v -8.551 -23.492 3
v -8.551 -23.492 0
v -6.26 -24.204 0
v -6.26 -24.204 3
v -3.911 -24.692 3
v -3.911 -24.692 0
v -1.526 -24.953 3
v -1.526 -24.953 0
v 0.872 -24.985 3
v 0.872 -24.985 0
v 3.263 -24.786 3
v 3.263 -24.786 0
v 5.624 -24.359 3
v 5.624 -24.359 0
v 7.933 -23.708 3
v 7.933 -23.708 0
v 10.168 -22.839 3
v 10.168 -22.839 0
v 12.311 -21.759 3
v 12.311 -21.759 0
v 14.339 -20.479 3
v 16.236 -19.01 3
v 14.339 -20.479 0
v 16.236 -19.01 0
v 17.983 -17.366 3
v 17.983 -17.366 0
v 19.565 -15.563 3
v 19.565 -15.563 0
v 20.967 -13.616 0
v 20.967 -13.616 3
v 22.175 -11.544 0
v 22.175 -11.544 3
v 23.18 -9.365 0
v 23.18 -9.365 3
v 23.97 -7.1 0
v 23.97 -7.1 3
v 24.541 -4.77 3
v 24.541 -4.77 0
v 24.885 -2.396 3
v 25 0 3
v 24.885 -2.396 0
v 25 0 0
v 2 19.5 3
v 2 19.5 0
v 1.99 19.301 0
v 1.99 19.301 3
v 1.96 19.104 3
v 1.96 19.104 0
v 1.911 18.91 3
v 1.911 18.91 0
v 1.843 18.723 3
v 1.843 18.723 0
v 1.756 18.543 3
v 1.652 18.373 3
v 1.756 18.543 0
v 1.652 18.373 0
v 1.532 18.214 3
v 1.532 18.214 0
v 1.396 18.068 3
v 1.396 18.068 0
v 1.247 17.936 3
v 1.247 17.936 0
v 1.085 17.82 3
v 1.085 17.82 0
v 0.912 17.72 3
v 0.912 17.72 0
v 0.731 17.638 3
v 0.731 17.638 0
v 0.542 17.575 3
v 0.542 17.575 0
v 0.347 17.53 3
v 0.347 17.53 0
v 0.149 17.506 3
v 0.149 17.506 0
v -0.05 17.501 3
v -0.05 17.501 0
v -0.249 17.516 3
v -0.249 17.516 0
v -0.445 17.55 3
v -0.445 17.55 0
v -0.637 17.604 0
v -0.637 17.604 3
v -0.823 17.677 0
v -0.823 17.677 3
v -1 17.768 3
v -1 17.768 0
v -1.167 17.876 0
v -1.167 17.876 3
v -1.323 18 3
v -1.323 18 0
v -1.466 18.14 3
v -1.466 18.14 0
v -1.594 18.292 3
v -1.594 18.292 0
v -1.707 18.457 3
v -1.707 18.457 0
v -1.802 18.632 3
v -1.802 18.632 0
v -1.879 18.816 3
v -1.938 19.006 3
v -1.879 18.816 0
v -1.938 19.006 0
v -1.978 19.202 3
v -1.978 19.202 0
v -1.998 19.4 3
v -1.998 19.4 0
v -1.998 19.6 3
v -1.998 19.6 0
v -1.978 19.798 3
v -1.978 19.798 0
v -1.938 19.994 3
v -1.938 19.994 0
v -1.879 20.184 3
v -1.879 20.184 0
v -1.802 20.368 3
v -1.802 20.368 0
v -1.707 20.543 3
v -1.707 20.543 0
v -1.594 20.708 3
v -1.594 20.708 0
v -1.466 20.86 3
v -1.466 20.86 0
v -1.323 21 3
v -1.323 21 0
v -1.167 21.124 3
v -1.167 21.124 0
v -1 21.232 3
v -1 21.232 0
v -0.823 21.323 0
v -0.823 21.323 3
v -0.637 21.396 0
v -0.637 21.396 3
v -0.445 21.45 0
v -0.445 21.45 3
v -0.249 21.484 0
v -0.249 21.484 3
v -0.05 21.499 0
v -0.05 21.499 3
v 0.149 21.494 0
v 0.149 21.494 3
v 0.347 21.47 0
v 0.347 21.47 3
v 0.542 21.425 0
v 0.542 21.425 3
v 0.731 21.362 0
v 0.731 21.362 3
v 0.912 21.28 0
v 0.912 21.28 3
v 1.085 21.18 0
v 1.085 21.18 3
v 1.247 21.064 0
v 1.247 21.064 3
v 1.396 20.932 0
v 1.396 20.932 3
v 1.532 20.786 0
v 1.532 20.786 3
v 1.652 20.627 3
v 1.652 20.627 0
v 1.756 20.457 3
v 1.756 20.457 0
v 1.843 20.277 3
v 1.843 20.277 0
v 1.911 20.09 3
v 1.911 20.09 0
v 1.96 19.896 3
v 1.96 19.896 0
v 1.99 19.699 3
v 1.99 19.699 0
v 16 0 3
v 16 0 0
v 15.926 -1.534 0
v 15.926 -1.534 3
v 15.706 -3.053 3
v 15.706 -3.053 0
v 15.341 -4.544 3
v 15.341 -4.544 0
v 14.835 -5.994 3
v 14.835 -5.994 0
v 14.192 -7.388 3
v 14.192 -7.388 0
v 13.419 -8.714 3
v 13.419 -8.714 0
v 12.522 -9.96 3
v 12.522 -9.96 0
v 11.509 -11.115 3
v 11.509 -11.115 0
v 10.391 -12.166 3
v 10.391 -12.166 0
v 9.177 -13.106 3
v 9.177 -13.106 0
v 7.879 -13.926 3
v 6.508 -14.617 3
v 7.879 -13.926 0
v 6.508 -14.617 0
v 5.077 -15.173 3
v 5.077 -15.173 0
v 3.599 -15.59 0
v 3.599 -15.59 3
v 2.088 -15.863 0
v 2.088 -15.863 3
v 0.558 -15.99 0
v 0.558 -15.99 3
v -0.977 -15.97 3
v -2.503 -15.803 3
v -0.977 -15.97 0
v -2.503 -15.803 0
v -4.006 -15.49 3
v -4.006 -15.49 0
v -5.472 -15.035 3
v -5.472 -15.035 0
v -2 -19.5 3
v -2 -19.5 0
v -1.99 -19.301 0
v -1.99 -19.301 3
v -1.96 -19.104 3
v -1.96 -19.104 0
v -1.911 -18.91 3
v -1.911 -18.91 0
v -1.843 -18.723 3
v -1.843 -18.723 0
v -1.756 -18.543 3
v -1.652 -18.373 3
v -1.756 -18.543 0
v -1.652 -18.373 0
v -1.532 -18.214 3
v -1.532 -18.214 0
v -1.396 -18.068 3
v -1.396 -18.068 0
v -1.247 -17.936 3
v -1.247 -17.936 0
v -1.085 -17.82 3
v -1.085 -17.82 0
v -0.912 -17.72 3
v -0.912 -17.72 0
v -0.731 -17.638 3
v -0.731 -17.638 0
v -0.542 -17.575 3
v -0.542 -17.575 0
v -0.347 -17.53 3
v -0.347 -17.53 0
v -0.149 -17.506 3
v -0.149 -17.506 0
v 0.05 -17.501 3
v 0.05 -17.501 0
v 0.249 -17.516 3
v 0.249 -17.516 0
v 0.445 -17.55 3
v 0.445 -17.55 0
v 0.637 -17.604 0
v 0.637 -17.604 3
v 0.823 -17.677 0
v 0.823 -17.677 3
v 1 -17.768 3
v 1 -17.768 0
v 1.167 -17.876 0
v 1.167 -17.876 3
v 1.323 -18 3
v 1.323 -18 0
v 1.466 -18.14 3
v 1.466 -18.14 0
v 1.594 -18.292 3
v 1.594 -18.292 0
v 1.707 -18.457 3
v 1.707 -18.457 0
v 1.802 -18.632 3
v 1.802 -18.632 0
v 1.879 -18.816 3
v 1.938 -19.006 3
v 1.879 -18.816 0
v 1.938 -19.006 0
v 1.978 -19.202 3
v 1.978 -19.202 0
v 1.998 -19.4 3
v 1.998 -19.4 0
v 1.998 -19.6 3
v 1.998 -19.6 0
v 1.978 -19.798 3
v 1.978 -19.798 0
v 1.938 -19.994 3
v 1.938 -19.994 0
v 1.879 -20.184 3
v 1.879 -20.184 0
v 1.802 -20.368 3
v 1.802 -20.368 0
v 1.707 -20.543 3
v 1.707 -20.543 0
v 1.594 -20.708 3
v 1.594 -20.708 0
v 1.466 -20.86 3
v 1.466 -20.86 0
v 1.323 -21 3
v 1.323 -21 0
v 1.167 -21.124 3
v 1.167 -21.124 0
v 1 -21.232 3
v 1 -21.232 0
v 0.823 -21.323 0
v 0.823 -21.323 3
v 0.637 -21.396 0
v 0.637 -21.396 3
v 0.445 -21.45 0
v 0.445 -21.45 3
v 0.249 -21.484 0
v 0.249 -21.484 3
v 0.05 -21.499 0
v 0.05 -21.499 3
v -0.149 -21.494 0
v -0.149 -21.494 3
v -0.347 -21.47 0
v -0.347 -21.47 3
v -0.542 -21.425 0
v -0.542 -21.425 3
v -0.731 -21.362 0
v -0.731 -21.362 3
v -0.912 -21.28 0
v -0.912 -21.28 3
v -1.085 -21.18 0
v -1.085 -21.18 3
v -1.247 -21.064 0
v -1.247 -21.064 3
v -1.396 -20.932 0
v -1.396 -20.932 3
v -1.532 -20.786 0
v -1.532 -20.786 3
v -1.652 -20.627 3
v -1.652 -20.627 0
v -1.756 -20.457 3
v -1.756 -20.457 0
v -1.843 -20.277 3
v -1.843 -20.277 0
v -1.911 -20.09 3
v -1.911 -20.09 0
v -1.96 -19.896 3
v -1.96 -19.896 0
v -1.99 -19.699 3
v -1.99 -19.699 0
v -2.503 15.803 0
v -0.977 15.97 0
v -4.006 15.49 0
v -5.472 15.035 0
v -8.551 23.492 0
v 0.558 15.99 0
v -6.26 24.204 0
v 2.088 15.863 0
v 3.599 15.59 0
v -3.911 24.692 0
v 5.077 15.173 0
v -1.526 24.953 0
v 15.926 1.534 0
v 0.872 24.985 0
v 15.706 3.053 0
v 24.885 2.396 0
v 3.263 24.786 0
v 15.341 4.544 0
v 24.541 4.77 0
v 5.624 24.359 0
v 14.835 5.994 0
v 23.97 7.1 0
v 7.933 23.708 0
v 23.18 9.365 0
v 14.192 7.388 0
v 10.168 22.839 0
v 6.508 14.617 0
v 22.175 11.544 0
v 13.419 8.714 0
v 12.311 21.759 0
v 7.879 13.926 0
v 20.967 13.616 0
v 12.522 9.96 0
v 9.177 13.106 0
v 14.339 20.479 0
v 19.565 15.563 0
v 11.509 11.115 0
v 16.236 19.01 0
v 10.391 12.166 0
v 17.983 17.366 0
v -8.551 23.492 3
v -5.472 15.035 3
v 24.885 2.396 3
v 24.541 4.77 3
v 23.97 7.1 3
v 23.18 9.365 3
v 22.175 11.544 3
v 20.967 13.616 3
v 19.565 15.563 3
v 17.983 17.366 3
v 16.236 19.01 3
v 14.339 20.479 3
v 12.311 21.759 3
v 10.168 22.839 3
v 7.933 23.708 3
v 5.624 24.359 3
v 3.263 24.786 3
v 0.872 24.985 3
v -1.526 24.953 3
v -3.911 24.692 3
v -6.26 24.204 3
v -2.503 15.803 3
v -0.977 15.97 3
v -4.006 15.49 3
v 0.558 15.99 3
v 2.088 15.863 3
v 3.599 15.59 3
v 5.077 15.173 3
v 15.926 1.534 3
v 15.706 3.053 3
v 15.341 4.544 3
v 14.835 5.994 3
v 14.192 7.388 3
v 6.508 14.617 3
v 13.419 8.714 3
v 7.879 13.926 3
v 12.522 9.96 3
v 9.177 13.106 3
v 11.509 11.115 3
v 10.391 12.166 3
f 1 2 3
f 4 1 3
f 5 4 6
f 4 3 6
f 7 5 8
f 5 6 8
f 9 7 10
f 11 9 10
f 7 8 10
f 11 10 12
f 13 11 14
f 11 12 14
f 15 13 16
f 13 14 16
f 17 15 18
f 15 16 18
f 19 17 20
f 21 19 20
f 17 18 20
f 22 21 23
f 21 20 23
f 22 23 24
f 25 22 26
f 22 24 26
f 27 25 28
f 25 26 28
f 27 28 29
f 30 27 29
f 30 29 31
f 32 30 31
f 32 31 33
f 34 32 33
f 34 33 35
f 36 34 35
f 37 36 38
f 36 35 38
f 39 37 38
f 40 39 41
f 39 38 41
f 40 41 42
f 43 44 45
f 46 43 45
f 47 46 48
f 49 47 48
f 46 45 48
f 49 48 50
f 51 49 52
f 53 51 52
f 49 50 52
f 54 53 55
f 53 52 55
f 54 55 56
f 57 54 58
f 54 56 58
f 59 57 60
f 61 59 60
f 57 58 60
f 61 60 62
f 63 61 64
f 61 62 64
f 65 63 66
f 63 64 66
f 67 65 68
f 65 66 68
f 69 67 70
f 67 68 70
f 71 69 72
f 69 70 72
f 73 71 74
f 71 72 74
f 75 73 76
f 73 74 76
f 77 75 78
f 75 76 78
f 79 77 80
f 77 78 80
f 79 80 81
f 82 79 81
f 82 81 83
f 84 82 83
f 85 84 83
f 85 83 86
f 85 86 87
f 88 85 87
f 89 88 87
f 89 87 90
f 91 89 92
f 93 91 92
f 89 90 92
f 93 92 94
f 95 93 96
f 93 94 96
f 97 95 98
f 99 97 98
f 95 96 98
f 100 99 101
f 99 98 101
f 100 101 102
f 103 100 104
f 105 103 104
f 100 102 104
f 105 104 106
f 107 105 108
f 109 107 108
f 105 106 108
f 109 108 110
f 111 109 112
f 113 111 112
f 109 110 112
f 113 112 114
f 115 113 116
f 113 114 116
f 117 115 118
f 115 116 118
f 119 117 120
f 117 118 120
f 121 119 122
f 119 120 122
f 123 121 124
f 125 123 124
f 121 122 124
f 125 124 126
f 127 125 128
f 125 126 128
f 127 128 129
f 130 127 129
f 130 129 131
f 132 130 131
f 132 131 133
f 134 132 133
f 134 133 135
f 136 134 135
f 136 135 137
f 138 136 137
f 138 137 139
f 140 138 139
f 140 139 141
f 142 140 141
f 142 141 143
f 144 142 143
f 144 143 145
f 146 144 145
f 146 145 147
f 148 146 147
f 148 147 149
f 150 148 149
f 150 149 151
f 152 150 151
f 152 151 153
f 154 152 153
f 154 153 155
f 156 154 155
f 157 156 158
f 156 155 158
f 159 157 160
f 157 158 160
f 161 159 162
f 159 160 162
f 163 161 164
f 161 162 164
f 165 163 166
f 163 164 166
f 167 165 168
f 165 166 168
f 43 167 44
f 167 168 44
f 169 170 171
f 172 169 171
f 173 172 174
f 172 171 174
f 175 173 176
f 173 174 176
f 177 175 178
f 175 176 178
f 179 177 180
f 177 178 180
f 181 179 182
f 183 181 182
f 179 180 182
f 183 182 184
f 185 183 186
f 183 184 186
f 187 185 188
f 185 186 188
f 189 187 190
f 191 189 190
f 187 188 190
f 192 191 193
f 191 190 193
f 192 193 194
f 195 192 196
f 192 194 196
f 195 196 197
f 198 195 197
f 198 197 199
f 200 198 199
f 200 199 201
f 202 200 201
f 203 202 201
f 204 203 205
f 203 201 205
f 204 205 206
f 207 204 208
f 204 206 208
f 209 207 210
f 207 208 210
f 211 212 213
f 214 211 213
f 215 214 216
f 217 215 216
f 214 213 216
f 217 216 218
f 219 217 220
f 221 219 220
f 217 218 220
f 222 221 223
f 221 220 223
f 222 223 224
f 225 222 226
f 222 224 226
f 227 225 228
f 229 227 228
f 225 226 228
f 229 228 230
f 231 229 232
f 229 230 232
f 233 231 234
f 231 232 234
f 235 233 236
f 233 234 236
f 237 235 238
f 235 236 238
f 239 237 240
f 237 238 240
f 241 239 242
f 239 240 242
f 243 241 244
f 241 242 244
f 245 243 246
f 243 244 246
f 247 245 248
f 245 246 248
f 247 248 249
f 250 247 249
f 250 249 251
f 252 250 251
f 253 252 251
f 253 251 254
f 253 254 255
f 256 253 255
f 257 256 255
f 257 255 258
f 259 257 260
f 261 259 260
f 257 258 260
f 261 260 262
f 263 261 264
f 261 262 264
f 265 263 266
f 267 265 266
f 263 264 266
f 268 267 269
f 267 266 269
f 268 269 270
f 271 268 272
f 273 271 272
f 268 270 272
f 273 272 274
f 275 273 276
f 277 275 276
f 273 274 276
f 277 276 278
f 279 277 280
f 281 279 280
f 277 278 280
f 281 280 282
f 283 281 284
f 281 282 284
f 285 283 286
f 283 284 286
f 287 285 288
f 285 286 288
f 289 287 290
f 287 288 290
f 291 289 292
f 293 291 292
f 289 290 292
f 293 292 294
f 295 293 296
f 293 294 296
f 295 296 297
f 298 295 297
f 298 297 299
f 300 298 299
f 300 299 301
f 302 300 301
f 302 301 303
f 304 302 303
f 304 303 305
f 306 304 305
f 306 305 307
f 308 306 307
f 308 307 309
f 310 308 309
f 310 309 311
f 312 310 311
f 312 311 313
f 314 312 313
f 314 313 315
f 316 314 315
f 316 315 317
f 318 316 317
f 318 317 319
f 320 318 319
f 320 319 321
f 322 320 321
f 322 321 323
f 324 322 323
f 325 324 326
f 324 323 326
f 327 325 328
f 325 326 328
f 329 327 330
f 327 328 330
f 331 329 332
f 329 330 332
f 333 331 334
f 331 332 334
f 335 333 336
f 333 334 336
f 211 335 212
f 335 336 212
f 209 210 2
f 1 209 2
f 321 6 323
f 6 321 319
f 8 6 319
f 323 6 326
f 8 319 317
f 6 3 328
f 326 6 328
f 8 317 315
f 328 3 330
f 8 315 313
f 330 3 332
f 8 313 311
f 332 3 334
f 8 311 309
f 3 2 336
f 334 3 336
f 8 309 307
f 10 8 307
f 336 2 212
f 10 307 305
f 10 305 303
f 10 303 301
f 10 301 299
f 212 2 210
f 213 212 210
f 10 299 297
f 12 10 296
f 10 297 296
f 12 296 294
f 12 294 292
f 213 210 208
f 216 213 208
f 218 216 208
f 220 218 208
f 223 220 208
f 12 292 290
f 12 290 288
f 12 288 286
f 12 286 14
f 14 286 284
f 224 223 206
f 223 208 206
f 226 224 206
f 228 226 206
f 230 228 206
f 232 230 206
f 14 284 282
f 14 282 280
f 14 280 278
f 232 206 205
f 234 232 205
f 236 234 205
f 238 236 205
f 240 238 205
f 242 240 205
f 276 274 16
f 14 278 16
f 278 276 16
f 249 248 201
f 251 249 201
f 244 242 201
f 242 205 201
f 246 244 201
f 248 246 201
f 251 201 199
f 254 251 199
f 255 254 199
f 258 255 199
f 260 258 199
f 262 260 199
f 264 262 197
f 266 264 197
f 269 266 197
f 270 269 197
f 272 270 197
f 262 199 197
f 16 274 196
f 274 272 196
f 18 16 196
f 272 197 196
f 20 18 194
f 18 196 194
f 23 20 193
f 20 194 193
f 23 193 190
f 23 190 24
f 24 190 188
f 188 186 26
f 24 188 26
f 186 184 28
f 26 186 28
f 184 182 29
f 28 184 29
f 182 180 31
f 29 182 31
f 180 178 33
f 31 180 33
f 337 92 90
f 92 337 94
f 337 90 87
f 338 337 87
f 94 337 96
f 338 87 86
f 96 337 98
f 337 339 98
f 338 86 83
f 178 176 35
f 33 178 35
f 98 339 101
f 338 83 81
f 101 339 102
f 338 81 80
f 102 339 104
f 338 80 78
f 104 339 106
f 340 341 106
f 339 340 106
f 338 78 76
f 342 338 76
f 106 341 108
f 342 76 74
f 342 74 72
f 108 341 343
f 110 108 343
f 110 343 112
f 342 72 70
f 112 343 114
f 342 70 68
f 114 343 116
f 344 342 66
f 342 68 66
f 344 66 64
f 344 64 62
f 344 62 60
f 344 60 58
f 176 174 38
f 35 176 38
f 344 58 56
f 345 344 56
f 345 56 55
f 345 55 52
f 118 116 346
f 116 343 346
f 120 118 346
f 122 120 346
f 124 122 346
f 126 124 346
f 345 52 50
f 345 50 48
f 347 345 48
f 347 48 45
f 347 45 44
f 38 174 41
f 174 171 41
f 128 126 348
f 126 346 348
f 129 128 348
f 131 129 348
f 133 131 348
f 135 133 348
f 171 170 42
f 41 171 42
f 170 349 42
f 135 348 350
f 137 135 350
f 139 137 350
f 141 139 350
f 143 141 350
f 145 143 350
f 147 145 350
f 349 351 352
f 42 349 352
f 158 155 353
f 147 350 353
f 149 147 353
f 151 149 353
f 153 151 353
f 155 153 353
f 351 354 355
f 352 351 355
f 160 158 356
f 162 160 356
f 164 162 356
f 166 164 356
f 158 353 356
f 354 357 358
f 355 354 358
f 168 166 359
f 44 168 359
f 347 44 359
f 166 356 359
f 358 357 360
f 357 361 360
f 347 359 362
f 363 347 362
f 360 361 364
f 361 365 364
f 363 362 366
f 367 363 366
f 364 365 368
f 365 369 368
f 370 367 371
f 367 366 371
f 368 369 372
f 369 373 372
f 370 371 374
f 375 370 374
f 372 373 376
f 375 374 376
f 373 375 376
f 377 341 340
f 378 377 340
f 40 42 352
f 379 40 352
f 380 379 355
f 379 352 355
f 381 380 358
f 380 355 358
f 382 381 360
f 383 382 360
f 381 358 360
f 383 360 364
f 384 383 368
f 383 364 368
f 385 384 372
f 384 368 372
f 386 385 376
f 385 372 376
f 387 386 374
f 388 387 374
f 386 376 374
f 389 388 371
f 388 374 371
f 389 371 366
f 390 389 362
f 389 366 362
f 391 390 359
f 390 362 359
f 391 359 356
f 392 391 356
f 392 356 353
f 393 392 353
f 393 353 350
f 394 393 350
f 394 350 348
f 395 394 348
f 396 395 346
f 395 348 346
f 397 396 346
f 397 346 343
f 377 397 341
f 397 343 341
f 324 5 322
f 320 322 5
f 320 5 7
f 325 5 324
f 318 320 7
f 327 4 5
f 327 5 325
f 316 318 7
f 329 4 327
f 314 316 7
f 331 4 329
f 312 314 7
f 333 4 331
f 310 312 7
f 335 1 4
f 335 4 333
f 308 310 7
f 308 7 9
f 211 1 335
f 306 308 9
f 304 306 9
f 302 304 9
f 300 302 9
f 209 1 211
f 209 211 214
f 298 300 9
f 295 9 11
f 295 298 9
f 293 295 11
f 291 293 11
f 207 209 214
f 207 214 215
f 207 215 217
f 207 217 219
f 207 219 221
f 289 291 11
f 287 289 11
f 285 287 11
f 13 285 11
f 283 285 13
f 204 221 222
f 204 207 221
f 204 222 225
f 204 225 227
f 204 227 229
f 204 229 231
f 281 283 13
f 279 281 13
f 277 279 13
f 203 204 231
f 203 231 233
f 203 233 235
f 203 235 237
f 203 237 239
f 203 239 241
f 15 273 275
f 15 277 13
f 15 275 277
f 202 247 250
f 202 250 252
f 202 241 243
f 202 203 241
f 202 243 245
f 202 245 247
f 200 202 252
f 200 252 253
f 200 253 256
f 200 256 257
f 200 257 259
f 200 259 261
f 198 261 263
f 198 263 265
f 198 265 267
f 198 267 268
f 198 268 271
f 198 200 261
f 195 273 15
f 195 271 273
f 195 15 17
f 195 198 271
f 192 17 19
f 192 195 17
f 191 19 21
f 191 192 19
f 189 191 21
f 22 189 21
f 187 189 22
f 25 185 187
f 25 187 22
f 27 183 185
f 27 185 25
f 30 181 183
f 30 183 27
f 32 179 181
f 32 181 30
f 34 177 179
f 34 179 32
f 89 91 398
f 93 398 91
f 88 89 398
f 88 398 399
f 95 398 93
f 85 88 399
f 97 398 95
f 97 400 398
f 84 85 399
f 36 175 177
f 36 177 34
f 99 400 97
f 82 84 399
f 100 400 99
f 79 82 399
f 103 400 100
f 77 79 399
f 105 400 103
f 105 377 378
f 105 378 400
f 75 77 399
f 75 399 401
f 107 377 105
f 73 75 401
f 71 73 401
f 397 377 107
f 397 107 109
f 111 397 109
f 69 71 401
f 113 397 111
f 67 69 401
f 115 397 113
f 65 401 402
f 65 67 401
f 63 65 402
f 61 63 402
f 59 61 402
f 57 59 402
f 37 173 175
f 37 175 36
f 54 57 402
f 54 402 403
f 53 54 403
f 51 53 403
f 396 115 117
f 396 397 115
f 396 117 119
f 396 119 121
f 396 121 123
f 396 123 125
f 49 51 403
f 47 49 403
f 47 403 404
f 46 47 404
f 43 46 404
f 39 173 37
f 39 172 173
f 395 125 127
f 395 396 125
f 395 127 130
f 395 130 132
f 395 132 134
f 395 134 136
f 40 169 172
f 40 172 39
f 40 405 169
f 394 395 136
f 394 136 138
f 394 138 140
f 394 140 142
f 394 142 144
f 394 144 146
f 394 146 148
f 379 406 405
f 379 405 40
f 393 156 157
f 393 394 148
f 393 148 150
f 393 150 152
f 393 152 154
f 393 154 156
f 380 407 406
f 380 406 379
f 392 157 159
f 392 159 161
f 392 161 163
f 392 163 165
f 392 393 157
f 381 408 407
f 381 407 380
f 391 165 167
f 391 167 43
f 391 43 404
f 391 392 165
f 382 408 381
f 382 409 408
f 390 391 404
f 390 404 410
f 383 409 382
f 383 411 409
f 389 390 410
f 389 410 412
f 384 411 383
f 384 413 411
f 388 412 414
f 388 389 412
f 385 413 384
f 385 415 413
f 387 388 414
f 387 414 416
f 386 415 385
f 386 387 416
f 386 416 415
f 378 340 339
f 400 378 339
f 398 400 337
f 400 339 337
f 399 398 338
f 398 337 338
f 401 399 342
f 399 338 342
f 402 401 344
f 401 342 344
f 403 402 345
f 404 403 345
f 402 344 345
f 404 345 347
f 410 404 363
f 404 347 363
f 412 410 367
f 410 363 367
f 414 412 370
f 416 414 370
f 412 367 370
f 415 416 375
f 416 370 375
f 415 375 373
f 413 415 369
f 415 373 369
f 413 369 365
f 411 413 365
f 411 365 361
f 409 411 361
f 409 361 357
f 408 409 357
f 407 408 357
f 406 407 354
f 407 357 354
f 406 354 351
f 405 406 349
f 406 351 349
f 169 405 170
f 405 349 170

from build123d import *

# Parameters (mm, degrees)
SALIENTE_EXTRUIR1_DEPTH = 3
CROQUIS2_R              = 2
CORTAR_EXTRUIR1_DEPTH   = 3


with BuildPart() as part:
    # Croquis1 → Saliente-Extruir1 (new body)
    with BuildSketch(Plane.XY):
        with BuildLine():
            ThreePointArc((16, 0), (9.177222982, -13.106432709), (-5.472322293, -15.035081933))
            Line((-5.472322293, -15.035081933), (-8.550503583, -23.49231552))
            ThreePointArc((-8.550503583, -23.49231552), (14.339410909, -20.478801107), (25, 0))
            ThreePointArc((25, 0), (14.339410909, 20.478801107), (-8.550503583, 23.49231552))
            Line((-8.550503583, 23.49231552), (-5.472322293, 15.035081933))
            ThreePointArc((-5.472322293, 15.035081933), (9.177222982, 13.106432709), (16, 0))
        make_face()
    extrude(amount=SALIENTE_EXTRUIR1_DEPTH)

    # Croquis2 → Cortar-Extruir1 (cut)
    with BuildSketch(Plane(origin=(0, 0, 0), x_dir=(-1, 0, 0), z_dir=(0, 0, -1))):
        with Locations((0, -19.5)):
            Circle(CROQUIS2_R)
        with Locations(Location((0, 19.5, 0), (0, 0, 180))):
            Circle(CROQUIS2_R)
    extrude(amount=-CORTAR_EXTRUIR1_DEPTH, mode=Mode.SUBTRACT)


solid = part.part
